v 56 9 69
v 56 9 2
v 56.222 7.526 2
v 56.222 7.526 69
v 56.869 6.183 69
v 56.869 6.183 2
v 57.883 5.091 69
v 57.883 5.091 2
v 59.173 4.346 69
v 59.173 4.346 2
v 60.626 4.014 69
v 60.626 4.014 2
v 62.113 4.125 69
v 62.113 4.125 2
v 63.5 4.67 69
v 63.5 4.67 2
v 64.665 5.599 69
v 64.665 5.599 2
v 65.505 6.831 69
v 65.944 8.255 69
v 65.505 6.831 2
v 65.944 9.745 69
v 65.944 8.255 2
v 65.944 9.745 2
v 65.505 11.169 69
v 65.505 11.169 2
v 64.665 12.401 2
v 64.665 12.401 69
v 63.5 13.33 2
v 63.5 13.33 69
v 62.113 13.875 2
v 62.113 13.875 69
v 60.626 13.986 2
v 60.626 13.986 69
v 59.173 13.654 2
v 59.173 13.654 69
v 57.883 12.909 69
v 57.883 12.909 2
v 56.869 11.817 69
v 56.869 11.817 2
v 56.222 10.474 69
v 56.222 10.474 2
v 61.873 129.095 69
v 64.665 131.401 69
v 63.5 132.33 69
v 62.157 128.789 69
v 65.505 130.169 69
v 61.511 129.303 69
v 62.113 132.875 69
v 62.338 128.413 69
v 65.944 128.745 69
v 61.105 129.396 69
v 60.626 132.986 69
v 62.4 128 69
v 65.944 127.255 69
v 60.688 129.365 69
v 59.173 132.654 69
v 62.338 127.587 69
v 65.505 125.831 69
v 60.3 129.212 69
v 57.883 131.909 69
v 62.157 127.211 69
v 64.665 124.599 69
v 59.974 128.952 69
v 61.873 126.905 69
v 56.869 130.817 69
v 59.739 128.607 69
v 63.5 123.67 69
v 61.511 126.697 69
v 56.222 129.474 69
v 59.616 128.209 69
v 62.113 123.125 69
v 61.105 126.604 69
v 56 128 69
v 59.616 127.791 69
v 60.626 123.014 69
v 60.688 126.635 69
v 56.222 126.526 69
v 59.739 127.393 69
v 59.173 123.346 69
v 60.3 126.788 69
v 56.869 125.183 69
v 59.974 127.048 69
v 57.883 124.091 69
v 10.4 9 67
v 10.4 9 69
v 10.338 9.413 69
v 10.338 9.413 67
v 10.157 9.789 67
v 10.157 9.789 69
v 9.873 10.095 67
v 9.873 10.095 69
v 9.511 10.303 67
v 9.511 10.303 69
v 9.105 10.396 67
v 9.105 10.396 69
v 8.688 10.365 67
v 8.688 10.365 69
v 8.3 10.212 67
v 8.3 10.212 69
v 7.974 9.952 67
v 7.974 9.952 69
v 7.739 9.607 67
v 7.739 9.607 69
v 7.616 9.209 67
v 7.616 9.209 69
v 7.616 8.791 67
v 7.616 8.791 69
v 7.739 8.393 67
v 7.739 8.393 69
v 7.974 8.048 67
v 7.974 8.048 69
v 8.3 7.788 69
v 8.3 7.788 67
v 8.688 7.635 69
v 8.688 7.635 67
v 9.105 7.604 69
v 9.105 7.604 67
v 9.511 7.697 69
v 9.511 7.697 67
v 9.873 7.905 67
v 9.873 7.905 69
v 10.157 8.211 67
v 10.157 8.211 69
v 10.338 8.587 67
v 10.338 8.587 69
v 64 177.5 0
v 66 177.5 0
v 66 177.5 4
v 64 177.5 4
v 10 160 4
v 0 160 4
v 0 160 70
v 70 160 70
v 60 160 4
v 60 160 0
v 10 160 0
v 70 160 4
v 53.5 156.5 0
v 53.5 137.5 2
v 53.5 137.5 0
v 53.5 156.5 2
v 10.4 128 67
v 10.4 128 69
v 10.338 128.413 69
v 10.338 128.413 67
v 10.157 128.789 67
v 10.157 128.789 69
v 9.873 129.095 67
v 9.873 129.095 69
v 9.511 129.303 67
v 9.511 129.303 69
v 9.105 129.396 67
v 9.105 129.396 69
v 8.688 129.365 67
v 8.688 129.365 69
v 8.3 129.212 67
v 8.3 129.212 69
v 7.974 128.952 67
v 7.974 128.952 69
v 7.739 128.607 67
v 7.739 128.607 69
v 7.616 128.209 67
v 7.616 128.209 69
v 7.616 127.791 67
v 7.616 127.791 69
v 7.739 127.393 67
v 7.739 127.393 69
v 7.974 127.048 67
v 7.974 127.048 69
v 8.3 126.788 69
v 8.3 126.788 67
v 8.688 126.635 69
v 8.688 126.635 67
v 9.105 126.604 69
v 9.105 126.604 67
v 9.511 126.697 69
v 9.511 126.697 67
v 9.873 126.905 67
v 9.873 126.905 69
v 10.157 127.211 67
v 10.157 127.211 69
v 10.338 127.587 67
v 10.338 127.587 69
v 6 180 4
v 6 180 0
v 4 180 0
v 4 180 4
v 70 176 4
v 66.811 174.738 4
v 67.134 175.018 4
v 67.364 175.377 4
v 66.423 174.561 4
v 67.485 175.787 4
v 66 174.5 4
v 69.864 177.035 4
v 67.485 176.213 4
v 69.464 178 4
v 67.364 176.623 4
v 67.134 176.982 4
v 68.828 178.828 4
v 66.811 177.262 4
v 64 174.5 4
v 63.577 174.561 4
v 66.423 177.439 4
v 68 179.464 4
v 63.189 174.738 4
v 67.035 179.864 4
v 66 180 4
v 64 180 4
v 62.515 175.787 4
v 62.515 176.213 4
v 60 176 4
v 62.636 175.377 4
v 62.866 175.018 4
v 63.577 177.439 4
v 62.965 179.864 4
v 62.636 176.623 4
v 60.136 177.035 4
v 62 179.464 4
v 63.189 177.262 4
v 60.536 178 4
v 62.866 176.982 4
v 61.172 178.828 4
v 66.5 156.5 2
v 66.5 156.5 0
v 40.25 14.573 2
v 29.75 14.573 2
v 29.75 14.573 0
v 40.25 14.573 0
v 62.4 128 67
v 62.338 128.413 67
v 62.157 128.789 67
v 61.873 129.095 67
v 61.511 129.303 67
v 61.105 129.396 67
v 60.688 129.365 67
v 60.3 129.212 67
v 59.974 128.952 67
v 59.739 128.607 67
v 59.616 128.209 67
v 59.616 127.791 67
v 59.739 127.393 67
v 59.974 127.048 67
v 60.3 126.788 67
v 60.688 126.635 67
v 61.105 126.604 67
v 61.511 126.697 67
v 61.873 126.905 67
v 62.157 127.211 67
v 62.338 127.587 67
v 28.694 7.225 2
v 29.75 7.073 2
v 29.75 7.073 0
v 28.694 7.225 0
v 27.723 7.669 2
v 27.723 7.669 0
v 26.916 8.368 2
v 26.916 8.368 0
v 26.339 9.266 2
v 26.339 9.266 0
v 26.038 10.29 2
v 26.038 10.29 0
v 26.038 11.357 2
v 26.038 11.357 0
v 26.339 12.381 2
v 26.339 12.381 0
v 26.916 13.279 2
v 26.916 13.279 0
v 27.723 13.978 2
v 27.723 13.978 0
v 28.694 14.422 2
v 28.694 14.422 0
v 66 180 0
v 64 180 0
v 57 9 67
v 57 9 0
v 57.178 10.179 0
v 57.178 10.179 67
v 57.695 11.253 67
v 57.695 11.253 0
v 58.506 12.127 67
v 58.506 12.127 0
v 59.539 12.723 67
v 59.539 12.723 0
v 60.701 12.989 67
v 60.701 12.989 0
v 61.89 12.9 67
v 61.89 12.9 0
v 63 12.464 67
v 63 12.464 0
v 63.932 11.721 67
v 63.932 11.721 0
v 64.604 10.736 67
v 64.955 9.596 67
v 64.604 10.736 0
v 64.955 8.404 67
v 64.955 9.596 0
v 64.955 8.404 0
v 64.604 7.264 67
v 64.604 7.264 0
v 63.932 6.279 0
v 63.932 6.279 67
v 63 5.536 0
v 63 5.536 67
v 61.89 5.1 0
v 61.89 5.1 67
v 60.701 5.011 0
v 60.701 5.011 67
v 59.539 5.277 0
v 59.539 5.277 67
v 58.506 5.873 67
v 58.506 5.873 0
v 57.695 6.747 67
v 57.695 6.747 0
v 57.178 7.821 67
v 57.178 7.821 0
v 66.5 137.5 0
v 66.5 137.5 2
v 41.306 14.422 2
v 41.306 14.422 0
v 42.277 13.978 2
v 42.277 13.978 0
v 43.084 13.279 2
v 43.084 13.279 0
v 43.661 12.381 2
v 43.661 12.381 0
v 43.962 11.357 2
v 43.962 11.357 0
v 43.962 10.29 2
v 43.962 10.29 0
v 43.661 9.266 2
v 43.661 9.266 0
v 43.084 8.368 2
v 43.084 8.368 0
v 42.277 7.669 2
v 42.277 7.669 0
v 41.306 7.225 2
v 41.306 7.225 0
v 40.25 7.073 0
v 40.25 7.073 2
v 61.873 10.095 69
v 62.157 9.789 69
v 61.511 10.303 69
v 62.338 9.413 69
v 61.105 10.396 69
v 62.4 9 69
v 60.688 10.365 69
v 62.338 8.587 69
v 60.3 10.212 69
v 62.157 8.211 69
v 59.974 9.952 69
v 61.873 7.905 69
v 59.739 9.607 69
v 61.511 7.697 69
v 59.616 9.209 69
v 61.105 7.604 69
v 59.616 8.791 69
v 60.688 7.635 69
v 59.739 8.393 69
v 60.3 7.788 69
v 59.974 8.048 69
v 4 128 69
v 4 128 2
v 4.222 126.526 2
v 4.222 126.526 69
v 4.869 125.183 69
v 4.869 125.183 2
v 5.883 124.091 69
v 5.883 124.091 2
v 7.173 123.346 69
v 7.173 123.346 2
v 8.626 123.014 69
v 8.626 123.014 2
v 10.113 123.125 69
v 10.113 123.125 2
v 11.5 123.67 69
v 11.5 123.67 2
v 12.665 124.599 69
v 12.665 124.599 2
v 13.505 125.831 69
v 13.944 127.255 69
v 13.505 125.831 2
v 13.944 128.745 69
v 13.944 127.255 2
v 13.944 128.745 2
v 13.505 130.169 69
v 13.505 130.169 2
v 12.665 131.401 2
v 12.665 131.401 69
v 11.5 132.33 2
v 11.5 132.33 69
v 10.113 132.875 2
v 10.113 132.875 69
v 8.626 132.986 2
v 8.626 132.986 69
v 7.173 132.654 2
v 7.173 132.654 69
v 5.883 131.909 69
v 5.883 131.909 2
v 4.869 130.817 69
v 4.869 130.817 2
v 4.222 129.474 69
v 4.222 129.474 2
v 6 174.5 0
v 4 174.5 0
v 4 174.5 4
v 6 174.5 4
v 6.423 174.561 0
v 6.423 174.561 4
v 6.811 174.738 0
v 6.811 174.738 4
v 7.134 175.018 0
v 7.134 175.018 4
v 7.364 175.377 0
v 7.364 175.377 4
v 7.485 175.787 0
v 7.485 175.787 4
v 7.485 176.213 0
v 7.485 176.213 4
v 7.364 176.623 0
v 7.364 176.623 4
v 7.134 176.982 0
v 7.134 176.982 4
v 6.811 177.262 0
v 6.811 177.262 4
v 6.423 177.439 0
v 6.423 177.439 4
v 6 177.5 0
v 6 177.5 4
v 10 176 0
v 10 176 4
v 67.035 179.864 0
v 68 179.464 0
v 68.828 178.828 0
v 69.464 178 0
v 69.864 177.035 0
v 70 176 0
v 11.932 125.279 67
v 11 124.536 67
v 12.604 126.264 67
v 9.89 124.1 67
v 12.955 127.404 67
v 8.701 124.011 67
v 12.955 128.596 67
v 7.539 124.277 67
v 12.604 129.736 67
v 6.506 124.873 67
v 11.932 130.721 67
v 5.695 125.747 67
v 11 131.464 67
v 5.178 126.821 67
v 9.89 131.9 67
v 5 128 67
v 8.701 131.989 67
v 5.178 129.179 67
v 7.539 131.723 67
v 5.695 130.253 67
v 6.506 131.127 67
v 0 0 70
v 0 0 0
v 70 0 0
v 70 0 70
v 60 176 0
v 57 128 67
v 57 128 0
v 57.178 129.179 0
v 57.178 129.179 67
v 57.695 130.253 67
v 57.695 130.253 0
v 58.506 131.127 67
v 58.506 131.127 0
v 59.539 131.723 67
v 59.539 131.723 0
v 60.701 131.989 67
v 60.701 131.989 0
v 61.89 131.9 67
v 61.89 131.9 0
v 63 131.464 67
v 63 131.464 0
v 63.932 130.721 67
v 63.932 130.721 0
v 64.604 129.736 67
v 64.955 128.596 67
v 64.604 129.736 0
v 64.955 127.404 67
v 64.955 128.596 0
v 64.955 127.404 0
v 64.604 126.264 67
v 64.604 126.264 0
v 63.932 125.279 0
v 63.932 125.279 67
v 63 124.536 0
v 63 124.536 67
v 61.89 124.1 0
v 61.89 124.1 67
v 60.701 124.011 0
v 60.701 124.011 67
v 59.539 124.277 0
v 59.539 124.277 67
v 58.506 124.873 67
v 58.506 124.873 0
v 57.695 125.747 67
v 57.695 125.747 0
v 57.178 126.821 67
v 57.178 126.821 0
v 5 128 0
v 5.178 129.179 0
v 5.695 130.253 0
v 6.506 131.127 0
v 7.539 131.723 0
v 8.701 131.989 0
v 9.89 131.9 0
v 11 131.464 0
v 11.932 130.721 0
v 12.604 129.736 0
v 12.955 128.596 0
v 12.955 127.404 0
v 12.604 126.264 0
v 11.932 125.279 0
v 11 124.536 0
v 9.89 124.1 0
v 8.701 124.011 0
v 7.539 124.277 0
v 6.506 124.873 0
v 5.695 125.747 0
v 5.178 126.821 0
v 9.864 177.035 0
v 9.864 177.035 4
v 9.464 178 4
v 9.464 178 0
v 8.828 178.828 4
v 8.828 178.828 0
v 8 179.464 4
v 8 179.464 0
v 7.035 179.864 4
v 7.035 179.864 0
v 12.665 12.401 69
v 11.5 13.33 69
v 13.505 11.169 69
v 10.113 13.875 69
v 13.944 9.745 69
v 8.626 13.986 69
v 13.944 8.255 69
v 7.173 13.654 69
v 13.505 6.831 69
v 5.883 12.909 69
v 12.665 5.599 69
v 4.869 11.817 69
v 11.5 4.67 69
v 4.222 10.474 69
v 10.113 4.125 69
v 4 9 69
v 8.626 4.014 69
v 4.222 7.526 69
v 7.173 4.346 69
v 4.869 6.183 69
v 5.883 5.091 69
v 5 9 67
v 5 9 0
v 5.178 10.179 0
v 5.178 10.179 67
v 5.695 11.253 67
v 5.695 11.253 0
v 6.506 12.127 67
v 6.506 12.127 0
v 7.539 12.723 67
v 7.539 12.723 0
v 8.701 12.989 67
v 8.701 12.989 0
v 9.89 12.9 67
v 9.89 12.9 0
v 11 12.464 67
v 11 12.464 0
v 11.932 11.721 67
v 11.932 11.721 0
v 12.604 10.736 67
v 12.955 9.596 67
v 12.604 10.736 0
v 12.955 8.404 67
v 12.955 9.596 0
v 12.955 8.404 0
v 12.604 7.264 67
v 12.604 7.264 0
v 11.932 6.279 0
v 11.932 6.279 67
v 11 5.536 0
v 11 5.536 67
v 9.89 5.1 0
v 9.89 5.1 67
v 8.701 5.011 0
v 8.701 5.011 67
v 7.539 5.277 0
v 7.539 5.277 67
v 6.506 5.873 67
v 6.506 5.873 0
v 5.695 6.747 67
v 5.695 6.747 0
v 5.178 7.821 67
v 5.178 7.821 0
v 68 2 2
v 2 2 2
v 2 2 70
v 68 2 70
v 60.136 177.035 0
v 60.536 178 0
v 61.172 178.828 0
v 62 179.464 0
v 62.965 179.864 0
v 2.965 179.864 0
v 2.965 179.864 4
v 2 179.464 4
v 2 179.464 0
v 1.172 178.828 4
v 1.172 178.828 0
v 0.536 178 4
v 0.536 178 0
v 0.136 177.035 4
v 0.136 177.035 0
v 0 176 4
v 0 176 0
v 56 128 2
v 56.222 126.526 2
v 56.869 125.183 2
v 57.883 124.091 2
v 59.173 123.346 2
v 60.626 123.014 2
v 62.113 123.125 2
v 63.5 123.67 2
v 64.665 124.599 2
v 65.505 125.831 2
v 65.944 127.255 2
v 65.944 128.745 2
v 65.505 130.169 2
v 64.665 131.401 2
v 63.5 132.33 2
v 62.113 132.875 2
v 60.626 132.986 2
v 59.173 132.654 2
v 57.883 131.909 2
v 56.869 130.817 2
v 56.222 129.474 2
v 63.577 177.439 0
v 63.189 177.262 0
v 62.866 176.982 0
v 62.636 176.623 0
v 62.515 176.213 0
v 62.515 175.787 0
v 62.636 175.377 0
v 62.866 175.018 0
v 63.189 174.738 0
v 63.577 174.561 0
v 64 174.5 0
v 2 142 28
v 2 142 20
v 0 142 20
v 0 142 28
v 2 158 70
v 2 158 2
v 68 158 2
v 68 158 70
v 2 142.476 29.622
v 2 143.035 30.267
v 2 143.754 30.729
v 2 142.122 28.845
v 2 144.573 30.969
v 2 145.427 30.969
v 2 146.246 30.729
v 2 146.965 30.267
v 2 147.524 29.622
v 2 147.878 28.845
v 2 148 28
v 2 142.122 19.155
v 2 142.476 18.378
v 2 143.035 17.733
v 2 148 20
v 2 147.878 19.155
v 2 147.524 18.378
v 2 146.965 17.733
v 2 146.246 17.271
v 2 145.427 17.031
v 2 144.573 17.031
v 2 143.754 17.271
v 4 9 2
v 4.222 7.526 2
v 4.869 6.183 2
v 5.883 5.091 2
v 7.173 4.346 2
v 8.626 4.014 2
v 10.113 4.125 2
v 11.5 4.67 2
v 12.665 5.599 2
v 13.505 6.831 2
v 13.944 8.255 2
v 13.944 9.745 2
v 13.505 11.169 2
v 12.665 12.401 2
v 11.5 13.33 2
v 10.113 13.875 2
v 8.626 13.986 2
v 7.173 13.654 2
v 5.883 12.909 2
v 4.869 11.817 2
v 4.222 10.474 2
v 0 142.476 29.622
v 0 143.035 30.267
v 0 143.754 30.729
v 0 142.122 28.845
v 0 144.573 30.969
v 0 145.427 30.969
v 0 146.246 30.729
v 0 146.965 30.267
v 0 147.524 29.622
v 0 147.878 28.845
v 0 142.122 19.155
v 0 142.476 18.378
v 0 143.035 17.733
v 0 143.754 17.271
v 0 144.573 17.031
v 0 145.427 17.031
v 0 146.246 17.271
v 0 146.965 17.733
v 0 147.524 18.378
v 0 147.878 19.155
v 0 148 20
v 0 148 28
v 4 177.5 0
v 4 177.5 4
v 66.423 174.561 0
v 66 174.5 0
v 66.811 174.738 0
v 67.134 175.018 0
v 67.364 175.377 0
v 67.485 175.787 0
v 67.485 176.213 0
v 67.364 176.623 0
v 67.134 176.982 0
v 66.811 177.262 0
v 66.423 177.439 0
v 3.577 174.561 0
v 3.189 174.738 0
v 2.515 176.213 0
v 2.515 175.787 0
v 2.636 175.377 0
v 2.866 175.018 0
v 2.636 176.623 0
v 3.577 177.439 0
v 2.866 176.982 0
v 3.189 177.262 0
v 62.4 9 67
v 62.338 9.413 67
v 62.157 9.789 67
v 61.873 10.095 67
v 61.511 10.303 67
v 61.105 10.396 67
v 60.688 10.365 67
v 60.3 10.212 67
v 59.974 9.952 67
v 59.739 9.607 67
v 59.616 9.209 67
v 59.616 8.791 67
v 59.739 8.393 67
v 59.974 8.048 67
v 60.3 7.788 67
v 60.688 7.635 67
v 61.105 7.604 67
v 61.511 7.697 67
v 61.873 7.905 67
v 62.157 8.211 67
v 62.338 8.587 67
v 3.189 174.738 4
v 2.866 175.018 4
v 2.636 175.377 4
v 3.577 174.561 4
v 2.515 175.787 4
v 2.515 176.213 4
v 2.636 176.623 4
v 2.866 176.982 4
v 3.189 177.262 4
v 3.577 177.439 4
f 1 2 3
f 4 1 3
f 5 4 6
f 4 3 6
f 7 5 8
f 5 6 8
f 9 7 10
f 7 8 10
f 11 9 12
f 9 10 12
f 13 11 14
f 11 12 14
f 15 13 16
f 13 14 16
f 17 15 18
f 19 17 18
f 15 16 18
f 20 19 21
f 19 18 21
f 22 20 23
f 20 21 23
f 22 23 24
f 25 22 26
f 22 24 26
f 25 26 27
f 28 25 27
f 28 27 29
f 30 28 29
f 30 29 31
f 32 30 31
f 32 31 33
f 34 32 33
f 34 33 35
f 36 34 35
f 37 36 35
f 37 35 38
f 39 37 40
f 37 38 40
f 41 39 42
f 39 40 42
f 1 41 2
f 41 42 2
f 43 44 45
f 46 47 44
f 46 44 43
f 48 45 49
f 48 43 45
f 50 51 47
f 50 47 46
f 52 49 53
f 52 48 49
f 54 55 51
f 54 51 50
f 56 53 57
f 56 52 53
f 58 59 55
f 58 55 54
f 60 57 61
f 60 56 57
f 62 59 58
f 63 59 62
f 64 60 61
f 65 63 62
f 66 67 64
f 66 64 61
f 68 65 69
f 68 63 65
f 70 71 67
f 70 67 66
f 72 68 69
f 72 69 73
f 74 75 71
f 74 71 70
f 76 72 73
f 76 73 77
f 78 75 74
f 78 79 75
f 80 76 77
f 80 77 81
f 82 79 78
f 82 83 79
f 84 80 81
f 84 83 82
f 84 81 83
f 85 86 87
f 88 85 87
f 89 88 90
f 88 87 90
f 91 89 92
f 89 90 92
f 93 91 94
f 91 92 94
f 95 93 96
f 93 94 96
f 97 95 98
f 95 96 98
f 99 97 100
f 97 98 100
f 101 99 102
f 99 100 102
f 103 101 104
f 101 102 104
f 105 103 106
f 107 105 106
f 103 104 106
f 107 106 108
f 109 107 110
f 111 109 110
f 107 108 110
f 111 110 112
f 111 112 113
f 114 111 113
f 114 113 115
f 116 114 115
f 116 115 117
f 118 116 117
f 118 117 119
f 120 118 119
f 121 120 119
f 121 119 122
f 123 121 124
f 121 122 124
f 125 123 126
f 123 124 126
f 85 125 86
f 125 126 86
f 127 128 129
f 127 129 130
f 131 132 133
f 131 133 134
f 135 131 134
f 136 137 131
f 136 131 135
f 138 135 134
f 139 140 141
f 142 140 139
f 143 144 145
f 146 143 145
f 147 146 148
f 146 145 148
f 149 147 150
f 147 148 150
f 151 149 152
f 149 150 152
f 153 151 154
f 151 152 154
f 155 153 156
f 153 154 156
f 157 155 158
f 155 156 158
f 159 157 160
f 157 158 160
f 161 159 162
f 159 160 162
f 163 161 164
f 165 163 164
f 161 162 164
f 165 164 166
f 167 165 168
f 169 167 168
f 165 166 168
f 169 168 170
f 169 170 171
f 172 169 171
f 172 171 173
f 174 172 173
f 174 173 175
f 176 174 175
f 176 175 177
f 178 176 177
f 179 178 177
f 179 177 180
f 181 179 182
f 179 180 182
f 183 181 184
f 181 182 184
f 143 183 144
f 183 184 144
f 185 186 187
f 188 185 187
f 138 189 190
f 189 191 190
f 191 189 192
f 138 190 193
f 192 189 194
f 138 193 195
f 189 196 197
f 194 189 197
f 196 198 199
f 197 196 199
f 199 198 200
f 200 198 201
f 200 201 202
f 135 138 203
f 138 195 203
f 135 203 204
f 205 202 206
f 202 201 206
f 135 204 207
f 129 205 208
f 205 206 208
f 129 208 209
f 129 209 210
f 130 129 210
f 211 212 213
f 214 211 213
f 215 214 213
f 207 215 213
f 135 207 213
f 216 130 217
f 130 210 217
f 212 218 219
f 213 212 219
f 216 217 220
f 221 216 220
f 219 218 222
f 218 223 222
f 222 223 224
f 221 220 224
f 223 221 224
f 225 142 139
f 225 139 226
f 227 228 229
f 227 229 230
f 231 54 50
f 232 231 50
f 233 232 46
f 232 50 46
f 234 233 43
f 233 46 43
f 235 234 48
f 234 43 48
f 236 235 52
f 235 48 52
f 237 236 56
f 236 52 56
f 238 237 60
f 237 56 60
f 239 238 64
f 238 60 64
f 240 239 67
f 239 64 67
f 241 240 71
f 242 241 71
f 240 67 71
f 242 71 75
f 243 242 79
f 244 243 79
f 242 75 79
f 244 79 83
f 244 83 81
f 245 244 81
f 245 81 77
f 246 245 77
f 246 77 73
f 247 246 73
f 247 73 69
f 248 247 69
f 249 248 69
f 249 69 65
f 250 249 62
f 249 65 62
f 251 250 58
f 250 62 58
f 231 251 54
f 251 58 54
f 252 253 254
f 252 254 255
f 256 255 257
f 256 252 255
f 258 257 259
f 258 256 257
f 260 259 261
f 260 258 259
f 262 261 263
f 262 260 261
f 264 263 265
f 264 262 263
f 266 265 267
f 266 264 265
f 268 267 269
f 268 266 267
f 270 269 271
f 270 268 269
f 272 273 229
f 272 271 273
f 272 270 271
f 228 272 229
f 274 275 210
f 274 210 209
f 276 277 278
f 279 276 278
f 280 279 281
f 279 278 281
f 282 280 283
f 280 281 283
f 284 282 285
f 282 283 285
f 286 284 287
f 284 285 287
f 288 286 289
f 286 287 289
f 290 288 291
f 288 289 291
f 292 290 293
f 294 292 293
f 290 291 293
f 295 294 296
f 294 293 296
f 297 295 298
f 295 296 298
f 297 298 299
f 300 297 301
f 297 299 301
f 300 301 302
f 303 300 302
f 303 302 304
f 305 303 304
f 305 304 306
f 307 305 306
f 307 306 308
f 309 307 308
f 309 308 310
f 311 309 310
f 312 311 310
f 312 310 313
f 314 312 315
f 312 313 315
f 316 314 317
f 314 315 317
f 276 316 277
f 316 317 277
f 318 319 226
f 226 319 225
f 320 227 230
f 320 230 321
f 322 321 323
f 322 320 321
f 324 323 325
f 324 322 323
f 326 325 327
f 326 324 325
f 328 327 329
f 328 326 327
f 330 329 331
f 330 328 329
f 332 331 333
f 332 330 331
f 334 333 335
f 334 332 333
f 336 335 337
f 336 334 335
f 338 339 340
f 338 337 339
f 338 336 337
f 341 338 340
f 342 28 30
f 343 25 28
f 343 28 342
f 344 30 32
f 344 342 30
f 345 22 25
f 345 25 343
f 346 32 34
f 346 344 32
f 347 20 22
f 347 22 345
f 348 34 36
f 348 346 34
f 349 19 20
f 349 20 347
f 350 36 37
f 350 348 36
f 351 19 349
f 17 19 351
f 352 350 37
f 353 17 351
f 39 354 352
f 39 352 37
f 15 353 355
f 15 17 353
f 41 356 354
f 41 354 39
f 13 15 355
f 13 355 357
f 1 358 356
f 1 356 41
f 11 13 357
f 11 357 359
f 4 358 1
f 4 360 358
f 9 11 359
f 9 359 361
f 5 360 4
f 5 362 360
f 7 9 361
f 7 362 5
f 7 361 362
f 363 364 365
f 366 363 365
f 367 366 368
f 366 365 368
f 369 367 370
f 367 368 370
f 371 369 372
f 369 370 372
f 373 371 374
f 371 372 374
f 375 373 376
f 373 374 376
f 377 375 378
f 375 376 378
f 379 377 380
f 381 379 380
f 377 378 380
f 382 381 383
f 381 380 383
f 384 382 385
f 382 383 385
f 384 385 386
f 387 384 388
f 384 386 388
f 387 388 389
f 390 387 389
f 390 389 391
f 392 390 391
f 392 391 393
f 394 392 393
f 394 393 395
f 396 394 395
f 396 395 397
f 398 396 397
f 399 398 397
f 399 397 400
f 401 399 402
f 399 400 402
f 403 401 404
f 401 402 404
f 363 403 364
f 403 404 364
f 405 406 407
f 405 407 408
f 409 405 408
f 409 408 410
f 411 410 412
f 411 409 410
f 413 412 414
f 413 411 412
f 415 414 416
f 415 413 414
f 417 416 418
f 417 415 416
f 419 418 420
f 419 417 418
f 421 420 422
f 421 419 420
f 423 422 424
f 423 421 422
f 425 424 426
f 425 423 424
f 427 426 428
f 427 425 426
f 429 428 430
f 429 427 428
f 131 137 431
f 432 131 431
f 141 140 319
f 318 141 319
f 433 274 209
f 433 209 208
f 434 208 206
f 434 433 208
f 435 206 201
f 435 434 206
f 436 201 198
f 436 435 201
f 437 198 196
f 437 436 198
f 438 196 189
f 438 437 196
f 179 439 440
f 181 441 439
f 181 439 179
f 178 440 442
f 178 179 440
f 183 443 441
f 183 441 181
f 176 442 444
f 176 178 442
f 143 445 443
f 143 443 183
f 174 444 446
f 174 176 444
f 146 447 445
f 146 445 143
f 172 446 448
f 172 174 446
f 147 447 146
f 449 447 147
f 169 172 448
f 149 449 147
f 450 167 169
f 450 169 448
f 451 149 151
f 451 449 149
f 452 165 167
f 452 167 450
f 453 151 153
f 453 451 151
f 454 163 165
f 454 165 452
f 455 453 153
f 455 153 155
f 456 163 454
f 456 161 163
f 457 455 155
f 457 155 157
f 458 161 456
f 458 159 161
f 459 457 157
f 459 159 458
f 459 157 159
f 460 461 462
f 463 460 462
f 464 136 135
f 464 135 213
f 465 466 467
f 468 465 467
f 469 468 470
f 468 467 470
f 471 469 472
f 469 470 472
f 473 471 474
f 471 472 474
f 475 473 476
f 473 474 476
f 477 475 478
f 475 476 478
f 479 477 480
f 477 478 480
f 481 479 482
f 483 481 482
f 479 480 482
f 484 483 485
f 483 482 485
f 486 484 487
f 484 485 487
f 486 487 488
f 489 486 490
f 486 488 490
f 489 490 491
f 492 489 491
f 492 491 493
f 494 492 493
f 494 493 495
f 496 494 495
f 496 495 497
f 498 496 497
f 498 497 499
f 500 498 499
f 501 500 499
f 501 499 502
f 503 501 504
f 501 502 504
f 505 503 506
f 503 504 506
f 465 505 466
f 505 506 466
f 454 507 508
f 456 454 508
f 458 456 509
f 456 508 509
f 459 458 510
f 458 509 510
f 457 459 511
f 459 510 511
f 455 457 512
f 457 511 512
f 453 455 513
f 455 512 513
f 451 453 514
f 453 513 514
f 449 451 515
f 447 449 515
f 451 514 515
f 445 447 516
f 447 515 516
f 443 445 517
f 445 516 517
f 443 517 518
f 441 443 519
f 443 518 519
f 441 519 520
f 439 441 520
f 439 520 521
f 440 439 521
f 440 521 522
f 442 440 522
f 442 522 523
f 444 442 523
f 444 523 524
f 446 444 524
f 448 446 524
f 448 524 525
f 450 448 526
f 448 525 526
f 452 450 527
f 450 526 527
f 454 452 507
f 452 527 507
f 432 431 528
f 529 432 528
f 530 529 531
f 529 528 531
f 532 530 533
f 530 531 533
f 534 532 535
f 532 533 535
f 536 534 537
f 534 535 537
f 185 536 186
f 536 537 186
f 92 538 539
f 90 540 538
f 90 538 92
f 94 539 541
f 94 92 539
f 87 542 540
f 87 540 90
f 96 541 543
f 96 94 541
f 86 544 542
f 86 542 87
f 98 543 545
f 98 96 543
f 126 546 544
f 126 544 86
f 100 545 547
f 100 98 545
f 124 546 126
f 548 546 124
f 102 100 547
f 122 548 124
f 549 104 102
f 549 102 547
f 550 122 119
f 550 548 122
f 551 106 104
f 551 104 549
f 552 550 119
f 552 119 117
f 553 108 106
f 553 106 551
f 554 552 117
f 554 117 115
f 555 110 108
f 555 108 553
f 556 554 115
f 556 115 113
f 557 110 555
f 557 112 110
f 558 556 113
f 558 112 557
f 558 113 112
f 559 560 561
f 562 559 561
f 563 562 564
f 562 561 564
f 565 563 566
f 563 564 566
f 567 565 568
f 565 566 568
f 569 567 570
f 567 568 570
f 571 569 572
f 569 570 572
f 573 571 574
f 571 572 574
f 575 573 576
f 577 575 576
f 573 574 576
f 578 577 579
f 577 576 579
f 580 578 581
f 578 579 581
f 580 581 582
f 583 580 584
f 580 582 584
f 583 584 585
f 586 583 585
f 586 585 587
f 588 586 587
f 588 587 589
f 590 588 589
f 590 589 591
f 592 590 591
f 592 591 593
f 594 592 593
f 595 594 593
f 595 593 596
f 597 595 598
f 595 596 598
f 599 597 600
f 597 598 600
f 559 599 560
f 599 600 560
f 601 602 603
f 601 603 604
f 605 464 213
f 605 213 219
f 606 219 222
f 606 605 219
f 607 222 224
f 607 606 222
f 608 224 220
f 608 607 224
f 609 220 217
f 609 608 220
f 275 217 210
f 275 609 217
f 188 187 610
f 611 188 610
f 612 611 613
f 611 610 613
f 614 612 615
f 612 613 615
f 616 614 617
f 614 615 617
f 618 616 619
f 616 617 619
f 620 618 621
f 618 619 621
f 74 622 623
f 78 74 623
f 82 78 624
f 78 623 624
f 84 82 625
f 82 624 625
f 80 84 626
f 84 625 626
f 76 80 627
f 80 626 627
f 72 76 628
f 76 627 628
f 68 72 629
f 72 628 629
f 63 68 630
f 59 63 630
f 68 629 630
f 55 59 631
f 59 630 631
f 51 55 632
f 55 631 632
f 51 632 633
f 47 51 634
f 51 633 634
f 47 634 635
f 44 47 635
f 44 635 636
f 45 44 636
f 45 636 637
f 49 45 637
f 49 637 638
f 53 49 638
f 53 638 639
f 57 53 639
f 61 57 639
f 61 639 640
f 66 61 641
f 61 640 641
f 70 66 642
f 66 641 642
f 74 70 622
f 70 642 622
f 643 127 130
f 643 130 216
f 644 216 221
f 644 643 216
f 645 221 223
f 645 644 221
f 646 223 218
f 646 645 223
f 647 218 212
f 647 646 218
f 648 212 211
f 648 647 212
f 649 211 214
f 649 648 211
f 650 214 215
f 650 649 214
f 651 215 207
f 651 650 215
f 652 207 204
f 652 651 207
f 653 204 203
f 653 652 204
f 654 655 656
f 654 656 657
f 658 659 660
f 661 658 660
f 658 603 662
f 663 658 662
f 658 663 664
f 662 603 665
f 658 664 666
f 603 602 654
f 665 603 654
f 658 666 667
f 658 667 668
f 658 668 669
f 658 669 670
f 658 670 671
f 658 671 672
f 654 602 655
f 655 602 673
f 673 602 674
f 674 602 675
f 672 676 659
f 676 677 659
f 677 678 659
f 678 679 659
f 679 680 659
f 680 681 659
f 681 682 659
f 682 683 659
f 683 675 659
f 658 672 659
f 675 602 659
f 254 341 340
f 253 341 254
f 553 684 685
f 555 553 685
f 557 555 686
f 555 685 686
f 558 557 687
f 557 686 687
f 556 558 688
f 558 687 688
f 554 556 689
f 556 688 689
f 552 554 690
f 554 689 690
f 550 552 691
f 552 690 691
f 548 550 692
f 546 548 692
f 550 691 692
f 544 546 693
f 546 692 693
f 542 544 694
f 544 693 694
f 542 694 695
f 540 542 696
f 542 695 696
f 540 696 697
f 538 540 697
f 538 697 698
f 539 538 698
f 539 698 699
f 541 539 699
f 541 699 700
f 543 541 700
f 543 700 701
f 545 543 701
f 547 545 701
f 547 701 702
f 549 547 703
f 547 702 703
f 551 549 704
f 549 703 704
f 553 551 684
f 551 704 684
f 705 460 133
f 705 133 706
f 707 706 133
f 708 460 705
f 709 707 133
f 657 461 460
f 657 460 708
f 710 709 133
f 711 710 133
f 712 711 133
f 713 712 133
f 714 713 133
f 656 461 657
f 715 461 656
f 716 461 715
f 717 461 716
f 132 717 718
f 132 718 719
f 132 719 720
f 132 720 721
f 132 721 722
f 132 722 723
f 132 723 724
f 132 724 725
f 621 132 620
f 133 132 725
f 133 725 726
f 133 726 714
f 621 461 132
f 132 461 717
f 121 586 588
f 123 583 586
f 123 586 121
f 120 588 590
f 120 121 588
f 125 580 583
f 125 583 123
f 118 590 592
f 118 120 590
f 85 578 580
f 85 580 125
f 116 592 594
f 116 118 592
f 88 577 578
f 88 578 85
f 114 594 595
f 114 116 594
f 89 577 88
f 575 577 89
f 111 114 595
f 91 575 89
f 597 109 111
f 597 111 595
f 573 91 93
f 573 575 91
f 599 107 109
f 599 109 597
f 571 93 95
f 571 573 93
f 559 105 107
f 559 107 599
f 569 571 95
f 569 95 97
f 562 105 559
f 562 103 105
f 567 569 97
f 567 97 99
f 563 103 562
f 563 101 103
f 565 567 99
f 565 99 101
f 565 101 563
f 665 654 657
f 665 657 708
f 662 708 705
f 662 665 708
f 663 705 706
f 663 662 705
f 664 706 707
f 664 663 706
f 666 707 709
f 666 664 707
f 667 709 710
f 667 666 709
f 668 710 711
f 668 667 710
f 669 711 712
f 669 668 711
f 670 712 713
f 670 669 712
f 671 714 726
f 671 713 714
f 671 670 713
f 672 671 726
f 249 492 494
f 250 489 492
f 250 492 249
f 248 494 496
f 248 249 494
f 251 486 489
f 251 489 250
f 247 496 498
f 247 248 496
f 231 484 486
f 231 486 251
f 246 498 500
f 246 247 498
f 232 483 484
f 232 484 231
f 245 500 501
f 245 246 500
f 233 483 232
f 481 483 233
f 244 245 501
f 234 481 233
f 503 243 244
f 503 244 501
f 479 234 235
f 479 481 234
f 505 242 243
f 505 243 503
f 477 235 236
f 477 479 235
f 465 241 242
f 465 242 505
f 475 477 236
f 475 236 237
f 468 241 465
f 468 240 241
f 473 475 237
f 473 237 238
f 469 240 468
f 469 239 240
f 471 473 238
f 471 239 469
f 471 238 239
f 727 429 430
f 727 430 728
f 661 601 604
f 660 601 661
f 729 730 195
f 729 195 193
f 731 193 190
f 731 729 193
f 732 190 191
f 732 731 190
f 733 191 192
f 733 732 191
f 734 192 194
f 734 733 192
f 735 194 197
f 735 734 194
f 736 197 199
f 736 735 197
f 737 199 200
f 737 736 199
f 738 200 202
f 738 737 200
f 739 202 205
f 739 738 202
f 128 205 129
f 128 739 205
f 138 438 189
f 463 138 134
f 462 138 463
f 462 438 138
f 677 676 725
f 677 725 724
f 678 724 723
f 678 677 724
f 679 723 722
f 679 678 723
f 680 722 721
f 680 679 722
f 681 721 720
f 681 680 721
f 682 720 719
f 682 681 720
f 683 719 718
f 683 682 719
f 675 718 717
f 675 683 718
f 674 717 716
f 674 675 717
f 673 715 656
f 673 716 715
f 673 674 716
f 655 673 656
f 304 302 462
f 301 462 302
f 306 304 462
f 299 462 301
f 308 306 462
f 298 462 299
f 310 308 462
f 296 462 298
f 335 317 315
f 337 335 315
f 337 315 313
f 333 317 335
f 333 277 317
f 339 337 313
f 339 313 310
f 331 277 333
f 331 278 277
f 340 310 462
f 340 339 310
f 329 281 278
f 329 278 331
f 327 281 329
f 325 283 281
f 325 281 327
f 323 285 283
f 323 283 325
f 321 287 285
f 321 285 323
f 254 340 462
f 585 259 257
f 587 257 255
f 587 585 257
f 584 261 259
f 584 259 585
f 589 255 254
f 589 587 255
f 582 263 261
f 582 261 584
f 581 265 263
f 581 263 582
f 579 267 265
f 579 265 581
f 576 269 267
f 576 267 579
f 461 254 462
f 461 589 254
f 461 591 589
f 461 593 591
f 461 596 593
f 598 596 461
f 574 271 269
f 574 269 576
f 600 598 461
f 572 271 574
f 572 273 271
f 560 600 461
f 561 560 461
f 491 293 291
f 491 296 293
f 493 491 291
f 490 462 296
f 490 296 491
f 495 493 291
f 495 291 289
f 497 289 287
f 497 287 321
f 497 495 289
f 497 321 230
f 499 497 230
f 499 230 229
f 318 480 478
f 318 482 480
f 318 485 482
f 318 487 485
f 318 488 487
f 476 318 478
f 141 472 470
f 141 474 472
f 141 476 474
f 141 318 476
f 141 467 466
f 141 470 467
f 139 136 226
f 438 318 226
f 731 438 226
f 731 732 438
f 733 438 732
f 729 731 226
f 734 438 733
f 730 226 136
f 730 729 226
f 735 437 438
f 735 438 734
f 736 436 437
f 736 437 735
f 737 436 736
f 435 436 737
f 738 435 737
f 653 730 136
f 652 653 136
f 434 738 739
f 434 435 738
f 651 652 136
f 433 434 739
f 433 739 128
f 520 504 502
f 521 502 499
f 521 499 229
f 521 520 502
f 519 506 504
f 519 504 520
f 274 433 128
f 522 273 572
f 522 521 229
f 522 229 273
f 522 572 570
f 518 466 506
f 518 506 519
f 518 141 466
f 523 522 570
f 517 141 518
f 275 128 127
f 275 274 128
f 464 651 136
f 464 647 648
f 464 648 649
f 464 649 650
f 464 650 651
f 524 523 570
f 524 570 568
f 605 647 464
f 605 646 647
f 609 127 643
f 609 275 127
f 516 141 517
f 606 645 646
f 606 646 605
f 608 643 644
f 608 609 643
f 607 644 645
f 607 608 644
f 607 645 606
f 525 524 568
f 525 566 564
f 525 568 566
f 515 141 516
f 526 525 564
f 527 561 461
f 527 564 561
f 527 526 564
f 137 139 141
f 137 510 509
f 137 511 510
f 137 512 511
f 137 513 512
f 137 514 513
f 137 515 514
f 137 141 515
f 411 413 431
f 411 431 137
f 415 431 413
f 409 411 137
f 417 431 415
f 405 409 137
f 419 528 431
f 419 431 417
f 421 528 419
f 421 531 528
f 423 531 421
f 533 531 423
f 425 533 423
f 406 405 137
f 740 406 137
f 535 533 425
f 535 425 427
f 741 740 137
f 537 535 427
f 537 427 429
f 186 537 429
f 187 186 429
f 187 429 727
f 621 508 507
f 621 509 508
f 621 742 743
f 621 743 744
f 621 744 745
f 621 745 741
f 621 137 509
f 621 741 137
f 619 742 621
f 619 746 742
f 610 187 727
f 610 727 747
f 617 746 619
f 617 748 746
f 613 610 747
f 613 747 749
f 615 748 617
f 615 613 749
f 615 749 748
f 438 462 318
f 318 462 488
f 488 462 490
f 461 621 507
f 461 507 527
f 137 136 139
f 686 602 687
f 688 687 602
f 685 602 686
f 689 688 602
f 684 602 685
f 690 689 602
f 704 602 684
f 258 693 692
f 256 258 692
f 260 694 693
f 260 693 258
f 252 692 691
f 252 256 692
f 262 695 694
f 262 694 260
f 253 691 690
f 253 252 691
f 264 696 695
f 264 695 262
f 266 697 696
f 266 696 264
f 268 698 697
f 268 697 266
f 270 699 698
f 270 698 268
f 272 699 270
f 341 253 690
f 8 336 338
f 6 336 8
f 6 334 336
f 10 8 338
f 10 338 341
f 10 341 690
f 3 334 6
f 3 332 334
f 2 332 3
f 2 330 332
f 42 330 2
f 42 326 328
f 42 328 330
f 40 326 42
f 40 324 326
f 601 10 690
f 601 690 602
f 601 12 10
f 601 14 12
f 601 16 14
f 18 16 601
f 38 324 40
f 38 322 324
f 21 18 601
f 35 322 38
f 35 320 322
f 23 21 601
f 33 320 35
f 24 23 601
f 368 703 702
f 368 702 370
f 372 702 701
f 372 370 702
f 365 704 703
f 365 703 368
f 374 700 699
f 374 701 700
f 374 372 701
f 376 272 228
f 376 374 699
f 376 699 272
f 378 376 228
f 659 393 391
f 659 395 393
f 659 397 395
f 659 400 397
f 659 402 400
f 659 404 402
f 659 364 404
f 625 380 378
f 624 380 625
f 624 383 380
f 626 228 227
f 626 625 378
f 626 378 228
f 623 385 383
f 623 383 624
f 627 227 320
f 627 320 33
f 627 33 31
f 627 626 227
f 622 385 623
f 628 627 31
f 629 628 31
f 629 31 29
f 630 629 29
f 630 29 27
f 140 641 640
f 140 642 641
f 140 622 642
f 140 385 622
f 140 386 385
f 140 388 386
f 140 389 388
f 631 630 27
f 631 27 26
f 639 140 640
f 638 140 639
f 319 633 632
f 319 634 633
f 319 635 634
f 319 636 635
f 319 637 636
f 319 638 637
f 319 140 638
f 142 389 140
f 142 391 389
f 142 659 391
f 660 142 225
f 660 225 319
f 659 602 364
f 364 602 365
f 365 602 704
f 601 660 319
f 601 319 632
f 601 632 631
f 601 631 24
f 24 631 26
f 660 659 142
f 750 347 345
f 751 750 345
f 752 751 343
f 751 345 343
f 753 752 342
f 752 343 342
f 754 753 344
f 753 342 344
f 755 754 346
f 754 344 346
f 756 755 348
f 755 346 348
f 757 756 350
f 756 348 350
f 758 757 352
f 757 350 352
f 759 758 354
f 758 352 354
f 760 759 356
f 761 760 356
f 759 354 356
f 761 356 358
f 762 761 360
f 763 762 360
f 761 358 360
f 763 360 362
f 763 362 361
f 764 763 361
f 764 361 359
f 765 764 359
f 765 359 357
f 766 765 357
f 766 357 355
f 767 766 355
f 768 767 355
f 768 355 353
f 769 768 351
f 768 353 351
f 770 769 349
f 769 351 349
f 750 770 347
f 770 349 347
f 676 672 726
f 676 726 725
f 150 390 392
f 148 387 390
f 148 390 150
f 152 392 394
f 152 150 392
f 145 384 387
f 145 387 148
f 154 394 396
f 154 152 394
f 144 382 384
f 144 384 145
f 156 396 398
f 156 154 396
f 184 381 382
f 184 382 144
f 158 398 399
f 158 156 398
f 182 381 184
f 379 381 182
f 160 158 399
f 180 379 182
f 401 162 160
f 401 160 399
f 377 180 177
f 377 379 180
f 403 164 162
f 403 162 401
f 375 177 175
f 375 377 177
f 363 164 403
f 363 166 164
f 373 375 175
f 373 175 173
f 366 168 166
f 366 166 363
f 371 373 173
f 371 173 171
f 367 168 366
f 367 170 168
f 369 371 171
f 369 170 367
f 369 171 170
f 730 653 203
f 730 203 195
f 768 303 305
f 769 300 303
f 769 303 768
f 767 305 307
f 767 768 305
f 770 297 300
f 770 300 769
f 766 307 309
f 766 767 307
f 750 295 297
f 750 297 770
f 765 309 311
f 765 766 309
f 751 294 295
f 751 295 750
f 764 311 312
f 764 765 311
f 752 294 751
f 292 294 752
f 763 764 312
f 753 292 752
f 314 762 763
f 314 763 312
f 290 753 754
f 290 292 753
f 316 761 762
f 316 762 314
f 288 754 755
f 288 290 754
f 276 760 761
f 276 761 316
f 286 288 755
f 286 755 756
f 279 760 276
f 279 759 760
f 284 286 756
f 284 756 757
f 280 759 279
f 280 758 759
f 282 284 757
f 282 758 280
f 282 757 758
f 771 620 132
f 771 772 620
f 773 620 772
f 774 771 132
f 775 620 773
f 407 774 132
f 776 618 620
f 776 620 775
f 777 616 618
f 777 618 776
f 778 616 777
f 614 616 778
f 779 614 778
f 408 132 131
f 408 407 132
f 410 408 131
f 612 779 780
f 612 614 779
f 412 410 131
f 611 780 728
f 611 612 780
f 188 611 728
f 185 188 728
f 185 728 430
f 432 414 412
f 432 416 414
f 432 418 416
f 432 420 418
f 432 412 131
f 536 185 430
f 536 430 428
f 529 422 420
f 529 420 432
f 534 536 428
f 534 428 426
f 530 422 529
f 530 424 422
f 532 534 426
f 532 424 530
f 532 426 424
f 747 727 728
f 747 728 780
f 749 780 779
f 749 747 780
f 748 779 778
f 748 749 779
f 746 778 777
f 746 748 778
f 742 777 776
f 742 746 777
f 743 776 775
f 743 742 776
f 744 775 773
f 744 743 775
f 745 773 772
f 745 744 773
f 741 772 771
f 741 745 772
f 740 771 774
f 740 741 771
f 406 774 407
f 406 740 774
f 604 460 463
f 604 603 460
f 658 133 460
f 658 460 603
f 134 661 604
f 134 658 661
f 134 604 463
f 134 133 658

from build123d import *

# Parameters (mm, degrees)
CROQUIS1_W              = 70
CROQUIS1_H              = 160
SALIENTE_EXTRUIR1_DEPTH = 70
VACIADO1_T              = -2
CROQUIS2_W              = 13
CROQUIS2_H              = 19
CORTAR_EXTRUIR1_DEPTH   = 188.413980268
CORTAR_EXTRUIR2_DEPTH   = 188.413980268
CORTAR_EXTRUIR3_DEPTH   = 188.413980268
CROQUIS5_R              = 5
CROQUIS5_R_2            = 3
SALIENTE_EXTRUIR2_DEPTH = 67
CROQUIS6_R              = 3.05
CROQUIS6_R_2            = 1.4
SALIENTE_EXTRUIR3_DEPTH = 2
SALIENTE_EXTRUIR4_DEPTH = 4
CROQUIS8_R              = 4
CORTAR_EXTRUIR4_DEPTH   = 67


with BuildPart() as part:
    # Croquis1 → Saliente-Extruir1 (new body)
    with BuildSketch(Plane.XY):
        with Locations((35, 80)):
            Rectangle(CROQUIS1_W, CROQUIS1_H)
    extrude(amount=SALIENTE_EXTRUIR1_DEPTH)

    # Vaciado1
    vaciado1_openings = [part.faces().sort_by_distance(p)[0] for p in [
        (35, 80, 70),
    ]]
    offset(amount=VACIADO1_T, openings=vaciado1_openings, kind=Kind.INTERSECTION)

    # Croquis2 → Cortar-Extruir1 (cut, through all)
    with BuildSketch(Plane.XY.offset(2)):
        with Locations((60, 147)):
            Rectangle(CROQUIS2_W, CROQUIS2_H)
    extrude(amount=-CORTAR_EXTRUIR1_DEPTH, mode=Mode.SUBTRACT)

    # Croquis3 → Cortar-Extruir2 (cut, through all)
    with BuildSketch(Plane.XY.offset(2)):
        with BuildLine():
            Line((29.75, 14.573472877), (40.25, 14.573472877))
            ThreePointArc((40.25, 14.573472877), (44, 10.823472877), (40.25, 7.073472877))
            Line((40.25, 7.073472877), (29.75, 7.073472877))
            ThreePointArc((29.75, 7.073472877), (26, 10.823472877), (29.75, 14.573472877))
        make_face()
    extrude(amount=-CORTAR_EXTRUIR2_DEPTH, mode=Mode.SUBTRACT)

    # Croquis4 → Cortar-Extruir3 (cut, through all)
    with BuildSketch(Plane(origin=(2, 0, 0), x_dir=(0, 0, -1), z_dir=(1, 0, 0))):
        with BuildLine():
            Line((-28, 148), (-20, 148))
            ThreePointArc((-20, 148), (-17, 145), (-20, 142))
            Line((-20, 142), (-28, 142))
            ThreePointArc((-28, 142), (-31, 145), (-28, 148))
        make_face()
    extrude(amount=-CORTAR_EXTRUIR3_DEPTH, mode=Mode.SUBTRACT)

    # Croquis5 → Saliente-Extruir2 (add)
    # profile 1 of 4: a face of its own
    with BuildSketch(Plane.XY.offset(2)):
        with Locations(Location((9, 128, 0), (0, 0, 180))):
            Circle(CROQUIS5_R)
        with Locations((9, 128)):
            Circle(CROQUIS5_R_2, mode=Mode.SUBTRACT)
    # profile 2 of 4: a face of its own
    with BuildSketch(Plane.XY.offset(2)):
        with Locations(Location((9, 9, 0), (0, 0, 180))):
            Circle(CROQUIS5_R)
        with Locations((9, 9)):
            Circle(CROQUIS5_R_2, mode=Mode.SUBTRACT)
    # profile 3 of 4: a face of its own
    with BuildSketch(Plane.XY.offset(2)):
        with Locations(Location((61, 128, 0), (0, 0, 180))):
            Circle(CROQUIS5_R)
        with Locations((61, 128)):
            Circle(CROQUIS5_R_2, mode=Mode.SUBTRACT)
    # profile 4 of 4: a face of its own
    with BuildSketch(Plane.XY.offset(2)):
        with Locations(Location((61, 9, 0), (0, 0, 180))):
            Circle(CROQUIS5_R)
        with Locations((61, 9)):
            Circle(CROQUIS5_R_2, mode=Mode.SUBTRACT)
    extrude(amount=SALIENTE_EXTRUIR2_DEPTH)

    # Croquis6 → Saliente-Extruir3 (add)
    # profile 1 of 4: a face of its own
    with BuildSketch(Plane.XY.offset(69)):
        with Locations((9, 128)):
            Circle(CROQUIS6_R)
        with Locations((9, 128)):
            Circle(CROQUIS6_R_2, mode=Mode.SUBTRACT)
    # profile 2 of 4: a face of its own
    with BuildSketch(Plane.XY.offset(69)):
        with Locations((61, 128)):
            Circle(CROQUIS6_R)
        with Locations((61, 128)):
            Circle(CROQUIS6_R_2, mode=Mode.SUBTRACT)
    # profile 3 of 4: a face of its own
    with BuildSketch(Plane.XY.offset(69)):
        with Locations((61, 9)):
            Circle(CROQUIS6_R)
        with Locations((61, 9)):
            Circle(CROQUIS6_R_2, mode=Mode.SUBTRACT)
    # profile 4 of 4: a face of its own
    with BuildSketch(Plane.XY.offset(69)):
        with Locations((9, 9)):
            Circle(CROQUIS6_R)
        with Locations((9, 9)):
            Circle(CROQUIS6_R_2, mode=Mode.SUBTRACT)
    extrude(amount=-SALIENTE_EXTRUIR3_DEPTH)

    # Croquis7 → Saliente-Extruir4 (add)
    # profile 1 of 2: a face of its own
    with BuildSketch(Plane(origin=(0, 0, 0), x_dir=(-1, 0, 0), z_dir=(0, 0, -1))):
        with BuildLine():
            Line((-70, 160), (-60, 160))
            Line((-60, 160), (-60, 176))
            ThreePointArc((-60, 176), (-61.171572875, 178.828427125), (-64, 180))
            Line((-64, 180), (-66, 180))
            ThreePointArc((-66, 180), (-68.828427125, 178.828427125), (-70, 176))
            Line((-70, 176), (-70, 160))
        make_face()
        with BuildLine():
            Line((-66, 177.5), (-64, 177.5))
            ThreePointArc((-64, 177.5), (-62.5, 176), (-64, 174.5))
            Line((-64, 174.5), (-66, 174.5))
            ThreePointArc((-66, 174.5), (-67.5, 176), (-66, 177.5))
        make_face(mode=Mode.SUBTRACT)
    # profile 2 of 2: a face of its own
    with BuildSketch(Plane(origin=(0, 0, 0), x_dir=(-1, 0, 0), z_dir=(0, 0, -1))):
        with BuildLine():
            Line((0, 160), (-10, 160))
            Line((-10, 160), (-10, 176))
            ThreePointArc((-10, 176), (-8.828427125, 178.828427125), (-6, 180))
            Line((-6, 180), (-4, 180))
            ThreePointArc((-4, 180), (-1.171572875, 178.828427125), (0, 176))
            Line((0, 176), (0, 160))
        make_face()
        with BuildLine():
            Line((-6, 177.5), (-4, 177.5))
            ThreePointArc((-4, 177.5), (-2.5, 176), (-4, 174.5))
            Line((-4, 174.5), (-6, 174.5))
            ThreePointArc((-6, 174.5), (-7.5, 176), (-6, 177.5))
        make_face(mode=Mode.SUBTRACT)
    extrude(amount=-SALIENTE_EXTRUIR4_DEPTH)

    # Croquis8 → Cortar-Extruir4 (cut)
    with BuildSketch(Plane(origin=(0, 0, 0), x_dir=(-1, 0, 0), z_dir=(0, 0, -1))):
        with Locations((-61, 128)):
            Circle(CROQUIS8_R)
        with Locations((-9, 128)):
            Circle(CROQUIS8_R)
        with Locations((-61, 9)):
            Circle(CROQUIS8_R)
        with Locations((-9, 9)):
            Circle(CROQUIS8_R)
    extrude(amount=-CORTAR_EXTRUIR4_DEPTH, mode=Mode.SUBTRACT)


solid = part.part
